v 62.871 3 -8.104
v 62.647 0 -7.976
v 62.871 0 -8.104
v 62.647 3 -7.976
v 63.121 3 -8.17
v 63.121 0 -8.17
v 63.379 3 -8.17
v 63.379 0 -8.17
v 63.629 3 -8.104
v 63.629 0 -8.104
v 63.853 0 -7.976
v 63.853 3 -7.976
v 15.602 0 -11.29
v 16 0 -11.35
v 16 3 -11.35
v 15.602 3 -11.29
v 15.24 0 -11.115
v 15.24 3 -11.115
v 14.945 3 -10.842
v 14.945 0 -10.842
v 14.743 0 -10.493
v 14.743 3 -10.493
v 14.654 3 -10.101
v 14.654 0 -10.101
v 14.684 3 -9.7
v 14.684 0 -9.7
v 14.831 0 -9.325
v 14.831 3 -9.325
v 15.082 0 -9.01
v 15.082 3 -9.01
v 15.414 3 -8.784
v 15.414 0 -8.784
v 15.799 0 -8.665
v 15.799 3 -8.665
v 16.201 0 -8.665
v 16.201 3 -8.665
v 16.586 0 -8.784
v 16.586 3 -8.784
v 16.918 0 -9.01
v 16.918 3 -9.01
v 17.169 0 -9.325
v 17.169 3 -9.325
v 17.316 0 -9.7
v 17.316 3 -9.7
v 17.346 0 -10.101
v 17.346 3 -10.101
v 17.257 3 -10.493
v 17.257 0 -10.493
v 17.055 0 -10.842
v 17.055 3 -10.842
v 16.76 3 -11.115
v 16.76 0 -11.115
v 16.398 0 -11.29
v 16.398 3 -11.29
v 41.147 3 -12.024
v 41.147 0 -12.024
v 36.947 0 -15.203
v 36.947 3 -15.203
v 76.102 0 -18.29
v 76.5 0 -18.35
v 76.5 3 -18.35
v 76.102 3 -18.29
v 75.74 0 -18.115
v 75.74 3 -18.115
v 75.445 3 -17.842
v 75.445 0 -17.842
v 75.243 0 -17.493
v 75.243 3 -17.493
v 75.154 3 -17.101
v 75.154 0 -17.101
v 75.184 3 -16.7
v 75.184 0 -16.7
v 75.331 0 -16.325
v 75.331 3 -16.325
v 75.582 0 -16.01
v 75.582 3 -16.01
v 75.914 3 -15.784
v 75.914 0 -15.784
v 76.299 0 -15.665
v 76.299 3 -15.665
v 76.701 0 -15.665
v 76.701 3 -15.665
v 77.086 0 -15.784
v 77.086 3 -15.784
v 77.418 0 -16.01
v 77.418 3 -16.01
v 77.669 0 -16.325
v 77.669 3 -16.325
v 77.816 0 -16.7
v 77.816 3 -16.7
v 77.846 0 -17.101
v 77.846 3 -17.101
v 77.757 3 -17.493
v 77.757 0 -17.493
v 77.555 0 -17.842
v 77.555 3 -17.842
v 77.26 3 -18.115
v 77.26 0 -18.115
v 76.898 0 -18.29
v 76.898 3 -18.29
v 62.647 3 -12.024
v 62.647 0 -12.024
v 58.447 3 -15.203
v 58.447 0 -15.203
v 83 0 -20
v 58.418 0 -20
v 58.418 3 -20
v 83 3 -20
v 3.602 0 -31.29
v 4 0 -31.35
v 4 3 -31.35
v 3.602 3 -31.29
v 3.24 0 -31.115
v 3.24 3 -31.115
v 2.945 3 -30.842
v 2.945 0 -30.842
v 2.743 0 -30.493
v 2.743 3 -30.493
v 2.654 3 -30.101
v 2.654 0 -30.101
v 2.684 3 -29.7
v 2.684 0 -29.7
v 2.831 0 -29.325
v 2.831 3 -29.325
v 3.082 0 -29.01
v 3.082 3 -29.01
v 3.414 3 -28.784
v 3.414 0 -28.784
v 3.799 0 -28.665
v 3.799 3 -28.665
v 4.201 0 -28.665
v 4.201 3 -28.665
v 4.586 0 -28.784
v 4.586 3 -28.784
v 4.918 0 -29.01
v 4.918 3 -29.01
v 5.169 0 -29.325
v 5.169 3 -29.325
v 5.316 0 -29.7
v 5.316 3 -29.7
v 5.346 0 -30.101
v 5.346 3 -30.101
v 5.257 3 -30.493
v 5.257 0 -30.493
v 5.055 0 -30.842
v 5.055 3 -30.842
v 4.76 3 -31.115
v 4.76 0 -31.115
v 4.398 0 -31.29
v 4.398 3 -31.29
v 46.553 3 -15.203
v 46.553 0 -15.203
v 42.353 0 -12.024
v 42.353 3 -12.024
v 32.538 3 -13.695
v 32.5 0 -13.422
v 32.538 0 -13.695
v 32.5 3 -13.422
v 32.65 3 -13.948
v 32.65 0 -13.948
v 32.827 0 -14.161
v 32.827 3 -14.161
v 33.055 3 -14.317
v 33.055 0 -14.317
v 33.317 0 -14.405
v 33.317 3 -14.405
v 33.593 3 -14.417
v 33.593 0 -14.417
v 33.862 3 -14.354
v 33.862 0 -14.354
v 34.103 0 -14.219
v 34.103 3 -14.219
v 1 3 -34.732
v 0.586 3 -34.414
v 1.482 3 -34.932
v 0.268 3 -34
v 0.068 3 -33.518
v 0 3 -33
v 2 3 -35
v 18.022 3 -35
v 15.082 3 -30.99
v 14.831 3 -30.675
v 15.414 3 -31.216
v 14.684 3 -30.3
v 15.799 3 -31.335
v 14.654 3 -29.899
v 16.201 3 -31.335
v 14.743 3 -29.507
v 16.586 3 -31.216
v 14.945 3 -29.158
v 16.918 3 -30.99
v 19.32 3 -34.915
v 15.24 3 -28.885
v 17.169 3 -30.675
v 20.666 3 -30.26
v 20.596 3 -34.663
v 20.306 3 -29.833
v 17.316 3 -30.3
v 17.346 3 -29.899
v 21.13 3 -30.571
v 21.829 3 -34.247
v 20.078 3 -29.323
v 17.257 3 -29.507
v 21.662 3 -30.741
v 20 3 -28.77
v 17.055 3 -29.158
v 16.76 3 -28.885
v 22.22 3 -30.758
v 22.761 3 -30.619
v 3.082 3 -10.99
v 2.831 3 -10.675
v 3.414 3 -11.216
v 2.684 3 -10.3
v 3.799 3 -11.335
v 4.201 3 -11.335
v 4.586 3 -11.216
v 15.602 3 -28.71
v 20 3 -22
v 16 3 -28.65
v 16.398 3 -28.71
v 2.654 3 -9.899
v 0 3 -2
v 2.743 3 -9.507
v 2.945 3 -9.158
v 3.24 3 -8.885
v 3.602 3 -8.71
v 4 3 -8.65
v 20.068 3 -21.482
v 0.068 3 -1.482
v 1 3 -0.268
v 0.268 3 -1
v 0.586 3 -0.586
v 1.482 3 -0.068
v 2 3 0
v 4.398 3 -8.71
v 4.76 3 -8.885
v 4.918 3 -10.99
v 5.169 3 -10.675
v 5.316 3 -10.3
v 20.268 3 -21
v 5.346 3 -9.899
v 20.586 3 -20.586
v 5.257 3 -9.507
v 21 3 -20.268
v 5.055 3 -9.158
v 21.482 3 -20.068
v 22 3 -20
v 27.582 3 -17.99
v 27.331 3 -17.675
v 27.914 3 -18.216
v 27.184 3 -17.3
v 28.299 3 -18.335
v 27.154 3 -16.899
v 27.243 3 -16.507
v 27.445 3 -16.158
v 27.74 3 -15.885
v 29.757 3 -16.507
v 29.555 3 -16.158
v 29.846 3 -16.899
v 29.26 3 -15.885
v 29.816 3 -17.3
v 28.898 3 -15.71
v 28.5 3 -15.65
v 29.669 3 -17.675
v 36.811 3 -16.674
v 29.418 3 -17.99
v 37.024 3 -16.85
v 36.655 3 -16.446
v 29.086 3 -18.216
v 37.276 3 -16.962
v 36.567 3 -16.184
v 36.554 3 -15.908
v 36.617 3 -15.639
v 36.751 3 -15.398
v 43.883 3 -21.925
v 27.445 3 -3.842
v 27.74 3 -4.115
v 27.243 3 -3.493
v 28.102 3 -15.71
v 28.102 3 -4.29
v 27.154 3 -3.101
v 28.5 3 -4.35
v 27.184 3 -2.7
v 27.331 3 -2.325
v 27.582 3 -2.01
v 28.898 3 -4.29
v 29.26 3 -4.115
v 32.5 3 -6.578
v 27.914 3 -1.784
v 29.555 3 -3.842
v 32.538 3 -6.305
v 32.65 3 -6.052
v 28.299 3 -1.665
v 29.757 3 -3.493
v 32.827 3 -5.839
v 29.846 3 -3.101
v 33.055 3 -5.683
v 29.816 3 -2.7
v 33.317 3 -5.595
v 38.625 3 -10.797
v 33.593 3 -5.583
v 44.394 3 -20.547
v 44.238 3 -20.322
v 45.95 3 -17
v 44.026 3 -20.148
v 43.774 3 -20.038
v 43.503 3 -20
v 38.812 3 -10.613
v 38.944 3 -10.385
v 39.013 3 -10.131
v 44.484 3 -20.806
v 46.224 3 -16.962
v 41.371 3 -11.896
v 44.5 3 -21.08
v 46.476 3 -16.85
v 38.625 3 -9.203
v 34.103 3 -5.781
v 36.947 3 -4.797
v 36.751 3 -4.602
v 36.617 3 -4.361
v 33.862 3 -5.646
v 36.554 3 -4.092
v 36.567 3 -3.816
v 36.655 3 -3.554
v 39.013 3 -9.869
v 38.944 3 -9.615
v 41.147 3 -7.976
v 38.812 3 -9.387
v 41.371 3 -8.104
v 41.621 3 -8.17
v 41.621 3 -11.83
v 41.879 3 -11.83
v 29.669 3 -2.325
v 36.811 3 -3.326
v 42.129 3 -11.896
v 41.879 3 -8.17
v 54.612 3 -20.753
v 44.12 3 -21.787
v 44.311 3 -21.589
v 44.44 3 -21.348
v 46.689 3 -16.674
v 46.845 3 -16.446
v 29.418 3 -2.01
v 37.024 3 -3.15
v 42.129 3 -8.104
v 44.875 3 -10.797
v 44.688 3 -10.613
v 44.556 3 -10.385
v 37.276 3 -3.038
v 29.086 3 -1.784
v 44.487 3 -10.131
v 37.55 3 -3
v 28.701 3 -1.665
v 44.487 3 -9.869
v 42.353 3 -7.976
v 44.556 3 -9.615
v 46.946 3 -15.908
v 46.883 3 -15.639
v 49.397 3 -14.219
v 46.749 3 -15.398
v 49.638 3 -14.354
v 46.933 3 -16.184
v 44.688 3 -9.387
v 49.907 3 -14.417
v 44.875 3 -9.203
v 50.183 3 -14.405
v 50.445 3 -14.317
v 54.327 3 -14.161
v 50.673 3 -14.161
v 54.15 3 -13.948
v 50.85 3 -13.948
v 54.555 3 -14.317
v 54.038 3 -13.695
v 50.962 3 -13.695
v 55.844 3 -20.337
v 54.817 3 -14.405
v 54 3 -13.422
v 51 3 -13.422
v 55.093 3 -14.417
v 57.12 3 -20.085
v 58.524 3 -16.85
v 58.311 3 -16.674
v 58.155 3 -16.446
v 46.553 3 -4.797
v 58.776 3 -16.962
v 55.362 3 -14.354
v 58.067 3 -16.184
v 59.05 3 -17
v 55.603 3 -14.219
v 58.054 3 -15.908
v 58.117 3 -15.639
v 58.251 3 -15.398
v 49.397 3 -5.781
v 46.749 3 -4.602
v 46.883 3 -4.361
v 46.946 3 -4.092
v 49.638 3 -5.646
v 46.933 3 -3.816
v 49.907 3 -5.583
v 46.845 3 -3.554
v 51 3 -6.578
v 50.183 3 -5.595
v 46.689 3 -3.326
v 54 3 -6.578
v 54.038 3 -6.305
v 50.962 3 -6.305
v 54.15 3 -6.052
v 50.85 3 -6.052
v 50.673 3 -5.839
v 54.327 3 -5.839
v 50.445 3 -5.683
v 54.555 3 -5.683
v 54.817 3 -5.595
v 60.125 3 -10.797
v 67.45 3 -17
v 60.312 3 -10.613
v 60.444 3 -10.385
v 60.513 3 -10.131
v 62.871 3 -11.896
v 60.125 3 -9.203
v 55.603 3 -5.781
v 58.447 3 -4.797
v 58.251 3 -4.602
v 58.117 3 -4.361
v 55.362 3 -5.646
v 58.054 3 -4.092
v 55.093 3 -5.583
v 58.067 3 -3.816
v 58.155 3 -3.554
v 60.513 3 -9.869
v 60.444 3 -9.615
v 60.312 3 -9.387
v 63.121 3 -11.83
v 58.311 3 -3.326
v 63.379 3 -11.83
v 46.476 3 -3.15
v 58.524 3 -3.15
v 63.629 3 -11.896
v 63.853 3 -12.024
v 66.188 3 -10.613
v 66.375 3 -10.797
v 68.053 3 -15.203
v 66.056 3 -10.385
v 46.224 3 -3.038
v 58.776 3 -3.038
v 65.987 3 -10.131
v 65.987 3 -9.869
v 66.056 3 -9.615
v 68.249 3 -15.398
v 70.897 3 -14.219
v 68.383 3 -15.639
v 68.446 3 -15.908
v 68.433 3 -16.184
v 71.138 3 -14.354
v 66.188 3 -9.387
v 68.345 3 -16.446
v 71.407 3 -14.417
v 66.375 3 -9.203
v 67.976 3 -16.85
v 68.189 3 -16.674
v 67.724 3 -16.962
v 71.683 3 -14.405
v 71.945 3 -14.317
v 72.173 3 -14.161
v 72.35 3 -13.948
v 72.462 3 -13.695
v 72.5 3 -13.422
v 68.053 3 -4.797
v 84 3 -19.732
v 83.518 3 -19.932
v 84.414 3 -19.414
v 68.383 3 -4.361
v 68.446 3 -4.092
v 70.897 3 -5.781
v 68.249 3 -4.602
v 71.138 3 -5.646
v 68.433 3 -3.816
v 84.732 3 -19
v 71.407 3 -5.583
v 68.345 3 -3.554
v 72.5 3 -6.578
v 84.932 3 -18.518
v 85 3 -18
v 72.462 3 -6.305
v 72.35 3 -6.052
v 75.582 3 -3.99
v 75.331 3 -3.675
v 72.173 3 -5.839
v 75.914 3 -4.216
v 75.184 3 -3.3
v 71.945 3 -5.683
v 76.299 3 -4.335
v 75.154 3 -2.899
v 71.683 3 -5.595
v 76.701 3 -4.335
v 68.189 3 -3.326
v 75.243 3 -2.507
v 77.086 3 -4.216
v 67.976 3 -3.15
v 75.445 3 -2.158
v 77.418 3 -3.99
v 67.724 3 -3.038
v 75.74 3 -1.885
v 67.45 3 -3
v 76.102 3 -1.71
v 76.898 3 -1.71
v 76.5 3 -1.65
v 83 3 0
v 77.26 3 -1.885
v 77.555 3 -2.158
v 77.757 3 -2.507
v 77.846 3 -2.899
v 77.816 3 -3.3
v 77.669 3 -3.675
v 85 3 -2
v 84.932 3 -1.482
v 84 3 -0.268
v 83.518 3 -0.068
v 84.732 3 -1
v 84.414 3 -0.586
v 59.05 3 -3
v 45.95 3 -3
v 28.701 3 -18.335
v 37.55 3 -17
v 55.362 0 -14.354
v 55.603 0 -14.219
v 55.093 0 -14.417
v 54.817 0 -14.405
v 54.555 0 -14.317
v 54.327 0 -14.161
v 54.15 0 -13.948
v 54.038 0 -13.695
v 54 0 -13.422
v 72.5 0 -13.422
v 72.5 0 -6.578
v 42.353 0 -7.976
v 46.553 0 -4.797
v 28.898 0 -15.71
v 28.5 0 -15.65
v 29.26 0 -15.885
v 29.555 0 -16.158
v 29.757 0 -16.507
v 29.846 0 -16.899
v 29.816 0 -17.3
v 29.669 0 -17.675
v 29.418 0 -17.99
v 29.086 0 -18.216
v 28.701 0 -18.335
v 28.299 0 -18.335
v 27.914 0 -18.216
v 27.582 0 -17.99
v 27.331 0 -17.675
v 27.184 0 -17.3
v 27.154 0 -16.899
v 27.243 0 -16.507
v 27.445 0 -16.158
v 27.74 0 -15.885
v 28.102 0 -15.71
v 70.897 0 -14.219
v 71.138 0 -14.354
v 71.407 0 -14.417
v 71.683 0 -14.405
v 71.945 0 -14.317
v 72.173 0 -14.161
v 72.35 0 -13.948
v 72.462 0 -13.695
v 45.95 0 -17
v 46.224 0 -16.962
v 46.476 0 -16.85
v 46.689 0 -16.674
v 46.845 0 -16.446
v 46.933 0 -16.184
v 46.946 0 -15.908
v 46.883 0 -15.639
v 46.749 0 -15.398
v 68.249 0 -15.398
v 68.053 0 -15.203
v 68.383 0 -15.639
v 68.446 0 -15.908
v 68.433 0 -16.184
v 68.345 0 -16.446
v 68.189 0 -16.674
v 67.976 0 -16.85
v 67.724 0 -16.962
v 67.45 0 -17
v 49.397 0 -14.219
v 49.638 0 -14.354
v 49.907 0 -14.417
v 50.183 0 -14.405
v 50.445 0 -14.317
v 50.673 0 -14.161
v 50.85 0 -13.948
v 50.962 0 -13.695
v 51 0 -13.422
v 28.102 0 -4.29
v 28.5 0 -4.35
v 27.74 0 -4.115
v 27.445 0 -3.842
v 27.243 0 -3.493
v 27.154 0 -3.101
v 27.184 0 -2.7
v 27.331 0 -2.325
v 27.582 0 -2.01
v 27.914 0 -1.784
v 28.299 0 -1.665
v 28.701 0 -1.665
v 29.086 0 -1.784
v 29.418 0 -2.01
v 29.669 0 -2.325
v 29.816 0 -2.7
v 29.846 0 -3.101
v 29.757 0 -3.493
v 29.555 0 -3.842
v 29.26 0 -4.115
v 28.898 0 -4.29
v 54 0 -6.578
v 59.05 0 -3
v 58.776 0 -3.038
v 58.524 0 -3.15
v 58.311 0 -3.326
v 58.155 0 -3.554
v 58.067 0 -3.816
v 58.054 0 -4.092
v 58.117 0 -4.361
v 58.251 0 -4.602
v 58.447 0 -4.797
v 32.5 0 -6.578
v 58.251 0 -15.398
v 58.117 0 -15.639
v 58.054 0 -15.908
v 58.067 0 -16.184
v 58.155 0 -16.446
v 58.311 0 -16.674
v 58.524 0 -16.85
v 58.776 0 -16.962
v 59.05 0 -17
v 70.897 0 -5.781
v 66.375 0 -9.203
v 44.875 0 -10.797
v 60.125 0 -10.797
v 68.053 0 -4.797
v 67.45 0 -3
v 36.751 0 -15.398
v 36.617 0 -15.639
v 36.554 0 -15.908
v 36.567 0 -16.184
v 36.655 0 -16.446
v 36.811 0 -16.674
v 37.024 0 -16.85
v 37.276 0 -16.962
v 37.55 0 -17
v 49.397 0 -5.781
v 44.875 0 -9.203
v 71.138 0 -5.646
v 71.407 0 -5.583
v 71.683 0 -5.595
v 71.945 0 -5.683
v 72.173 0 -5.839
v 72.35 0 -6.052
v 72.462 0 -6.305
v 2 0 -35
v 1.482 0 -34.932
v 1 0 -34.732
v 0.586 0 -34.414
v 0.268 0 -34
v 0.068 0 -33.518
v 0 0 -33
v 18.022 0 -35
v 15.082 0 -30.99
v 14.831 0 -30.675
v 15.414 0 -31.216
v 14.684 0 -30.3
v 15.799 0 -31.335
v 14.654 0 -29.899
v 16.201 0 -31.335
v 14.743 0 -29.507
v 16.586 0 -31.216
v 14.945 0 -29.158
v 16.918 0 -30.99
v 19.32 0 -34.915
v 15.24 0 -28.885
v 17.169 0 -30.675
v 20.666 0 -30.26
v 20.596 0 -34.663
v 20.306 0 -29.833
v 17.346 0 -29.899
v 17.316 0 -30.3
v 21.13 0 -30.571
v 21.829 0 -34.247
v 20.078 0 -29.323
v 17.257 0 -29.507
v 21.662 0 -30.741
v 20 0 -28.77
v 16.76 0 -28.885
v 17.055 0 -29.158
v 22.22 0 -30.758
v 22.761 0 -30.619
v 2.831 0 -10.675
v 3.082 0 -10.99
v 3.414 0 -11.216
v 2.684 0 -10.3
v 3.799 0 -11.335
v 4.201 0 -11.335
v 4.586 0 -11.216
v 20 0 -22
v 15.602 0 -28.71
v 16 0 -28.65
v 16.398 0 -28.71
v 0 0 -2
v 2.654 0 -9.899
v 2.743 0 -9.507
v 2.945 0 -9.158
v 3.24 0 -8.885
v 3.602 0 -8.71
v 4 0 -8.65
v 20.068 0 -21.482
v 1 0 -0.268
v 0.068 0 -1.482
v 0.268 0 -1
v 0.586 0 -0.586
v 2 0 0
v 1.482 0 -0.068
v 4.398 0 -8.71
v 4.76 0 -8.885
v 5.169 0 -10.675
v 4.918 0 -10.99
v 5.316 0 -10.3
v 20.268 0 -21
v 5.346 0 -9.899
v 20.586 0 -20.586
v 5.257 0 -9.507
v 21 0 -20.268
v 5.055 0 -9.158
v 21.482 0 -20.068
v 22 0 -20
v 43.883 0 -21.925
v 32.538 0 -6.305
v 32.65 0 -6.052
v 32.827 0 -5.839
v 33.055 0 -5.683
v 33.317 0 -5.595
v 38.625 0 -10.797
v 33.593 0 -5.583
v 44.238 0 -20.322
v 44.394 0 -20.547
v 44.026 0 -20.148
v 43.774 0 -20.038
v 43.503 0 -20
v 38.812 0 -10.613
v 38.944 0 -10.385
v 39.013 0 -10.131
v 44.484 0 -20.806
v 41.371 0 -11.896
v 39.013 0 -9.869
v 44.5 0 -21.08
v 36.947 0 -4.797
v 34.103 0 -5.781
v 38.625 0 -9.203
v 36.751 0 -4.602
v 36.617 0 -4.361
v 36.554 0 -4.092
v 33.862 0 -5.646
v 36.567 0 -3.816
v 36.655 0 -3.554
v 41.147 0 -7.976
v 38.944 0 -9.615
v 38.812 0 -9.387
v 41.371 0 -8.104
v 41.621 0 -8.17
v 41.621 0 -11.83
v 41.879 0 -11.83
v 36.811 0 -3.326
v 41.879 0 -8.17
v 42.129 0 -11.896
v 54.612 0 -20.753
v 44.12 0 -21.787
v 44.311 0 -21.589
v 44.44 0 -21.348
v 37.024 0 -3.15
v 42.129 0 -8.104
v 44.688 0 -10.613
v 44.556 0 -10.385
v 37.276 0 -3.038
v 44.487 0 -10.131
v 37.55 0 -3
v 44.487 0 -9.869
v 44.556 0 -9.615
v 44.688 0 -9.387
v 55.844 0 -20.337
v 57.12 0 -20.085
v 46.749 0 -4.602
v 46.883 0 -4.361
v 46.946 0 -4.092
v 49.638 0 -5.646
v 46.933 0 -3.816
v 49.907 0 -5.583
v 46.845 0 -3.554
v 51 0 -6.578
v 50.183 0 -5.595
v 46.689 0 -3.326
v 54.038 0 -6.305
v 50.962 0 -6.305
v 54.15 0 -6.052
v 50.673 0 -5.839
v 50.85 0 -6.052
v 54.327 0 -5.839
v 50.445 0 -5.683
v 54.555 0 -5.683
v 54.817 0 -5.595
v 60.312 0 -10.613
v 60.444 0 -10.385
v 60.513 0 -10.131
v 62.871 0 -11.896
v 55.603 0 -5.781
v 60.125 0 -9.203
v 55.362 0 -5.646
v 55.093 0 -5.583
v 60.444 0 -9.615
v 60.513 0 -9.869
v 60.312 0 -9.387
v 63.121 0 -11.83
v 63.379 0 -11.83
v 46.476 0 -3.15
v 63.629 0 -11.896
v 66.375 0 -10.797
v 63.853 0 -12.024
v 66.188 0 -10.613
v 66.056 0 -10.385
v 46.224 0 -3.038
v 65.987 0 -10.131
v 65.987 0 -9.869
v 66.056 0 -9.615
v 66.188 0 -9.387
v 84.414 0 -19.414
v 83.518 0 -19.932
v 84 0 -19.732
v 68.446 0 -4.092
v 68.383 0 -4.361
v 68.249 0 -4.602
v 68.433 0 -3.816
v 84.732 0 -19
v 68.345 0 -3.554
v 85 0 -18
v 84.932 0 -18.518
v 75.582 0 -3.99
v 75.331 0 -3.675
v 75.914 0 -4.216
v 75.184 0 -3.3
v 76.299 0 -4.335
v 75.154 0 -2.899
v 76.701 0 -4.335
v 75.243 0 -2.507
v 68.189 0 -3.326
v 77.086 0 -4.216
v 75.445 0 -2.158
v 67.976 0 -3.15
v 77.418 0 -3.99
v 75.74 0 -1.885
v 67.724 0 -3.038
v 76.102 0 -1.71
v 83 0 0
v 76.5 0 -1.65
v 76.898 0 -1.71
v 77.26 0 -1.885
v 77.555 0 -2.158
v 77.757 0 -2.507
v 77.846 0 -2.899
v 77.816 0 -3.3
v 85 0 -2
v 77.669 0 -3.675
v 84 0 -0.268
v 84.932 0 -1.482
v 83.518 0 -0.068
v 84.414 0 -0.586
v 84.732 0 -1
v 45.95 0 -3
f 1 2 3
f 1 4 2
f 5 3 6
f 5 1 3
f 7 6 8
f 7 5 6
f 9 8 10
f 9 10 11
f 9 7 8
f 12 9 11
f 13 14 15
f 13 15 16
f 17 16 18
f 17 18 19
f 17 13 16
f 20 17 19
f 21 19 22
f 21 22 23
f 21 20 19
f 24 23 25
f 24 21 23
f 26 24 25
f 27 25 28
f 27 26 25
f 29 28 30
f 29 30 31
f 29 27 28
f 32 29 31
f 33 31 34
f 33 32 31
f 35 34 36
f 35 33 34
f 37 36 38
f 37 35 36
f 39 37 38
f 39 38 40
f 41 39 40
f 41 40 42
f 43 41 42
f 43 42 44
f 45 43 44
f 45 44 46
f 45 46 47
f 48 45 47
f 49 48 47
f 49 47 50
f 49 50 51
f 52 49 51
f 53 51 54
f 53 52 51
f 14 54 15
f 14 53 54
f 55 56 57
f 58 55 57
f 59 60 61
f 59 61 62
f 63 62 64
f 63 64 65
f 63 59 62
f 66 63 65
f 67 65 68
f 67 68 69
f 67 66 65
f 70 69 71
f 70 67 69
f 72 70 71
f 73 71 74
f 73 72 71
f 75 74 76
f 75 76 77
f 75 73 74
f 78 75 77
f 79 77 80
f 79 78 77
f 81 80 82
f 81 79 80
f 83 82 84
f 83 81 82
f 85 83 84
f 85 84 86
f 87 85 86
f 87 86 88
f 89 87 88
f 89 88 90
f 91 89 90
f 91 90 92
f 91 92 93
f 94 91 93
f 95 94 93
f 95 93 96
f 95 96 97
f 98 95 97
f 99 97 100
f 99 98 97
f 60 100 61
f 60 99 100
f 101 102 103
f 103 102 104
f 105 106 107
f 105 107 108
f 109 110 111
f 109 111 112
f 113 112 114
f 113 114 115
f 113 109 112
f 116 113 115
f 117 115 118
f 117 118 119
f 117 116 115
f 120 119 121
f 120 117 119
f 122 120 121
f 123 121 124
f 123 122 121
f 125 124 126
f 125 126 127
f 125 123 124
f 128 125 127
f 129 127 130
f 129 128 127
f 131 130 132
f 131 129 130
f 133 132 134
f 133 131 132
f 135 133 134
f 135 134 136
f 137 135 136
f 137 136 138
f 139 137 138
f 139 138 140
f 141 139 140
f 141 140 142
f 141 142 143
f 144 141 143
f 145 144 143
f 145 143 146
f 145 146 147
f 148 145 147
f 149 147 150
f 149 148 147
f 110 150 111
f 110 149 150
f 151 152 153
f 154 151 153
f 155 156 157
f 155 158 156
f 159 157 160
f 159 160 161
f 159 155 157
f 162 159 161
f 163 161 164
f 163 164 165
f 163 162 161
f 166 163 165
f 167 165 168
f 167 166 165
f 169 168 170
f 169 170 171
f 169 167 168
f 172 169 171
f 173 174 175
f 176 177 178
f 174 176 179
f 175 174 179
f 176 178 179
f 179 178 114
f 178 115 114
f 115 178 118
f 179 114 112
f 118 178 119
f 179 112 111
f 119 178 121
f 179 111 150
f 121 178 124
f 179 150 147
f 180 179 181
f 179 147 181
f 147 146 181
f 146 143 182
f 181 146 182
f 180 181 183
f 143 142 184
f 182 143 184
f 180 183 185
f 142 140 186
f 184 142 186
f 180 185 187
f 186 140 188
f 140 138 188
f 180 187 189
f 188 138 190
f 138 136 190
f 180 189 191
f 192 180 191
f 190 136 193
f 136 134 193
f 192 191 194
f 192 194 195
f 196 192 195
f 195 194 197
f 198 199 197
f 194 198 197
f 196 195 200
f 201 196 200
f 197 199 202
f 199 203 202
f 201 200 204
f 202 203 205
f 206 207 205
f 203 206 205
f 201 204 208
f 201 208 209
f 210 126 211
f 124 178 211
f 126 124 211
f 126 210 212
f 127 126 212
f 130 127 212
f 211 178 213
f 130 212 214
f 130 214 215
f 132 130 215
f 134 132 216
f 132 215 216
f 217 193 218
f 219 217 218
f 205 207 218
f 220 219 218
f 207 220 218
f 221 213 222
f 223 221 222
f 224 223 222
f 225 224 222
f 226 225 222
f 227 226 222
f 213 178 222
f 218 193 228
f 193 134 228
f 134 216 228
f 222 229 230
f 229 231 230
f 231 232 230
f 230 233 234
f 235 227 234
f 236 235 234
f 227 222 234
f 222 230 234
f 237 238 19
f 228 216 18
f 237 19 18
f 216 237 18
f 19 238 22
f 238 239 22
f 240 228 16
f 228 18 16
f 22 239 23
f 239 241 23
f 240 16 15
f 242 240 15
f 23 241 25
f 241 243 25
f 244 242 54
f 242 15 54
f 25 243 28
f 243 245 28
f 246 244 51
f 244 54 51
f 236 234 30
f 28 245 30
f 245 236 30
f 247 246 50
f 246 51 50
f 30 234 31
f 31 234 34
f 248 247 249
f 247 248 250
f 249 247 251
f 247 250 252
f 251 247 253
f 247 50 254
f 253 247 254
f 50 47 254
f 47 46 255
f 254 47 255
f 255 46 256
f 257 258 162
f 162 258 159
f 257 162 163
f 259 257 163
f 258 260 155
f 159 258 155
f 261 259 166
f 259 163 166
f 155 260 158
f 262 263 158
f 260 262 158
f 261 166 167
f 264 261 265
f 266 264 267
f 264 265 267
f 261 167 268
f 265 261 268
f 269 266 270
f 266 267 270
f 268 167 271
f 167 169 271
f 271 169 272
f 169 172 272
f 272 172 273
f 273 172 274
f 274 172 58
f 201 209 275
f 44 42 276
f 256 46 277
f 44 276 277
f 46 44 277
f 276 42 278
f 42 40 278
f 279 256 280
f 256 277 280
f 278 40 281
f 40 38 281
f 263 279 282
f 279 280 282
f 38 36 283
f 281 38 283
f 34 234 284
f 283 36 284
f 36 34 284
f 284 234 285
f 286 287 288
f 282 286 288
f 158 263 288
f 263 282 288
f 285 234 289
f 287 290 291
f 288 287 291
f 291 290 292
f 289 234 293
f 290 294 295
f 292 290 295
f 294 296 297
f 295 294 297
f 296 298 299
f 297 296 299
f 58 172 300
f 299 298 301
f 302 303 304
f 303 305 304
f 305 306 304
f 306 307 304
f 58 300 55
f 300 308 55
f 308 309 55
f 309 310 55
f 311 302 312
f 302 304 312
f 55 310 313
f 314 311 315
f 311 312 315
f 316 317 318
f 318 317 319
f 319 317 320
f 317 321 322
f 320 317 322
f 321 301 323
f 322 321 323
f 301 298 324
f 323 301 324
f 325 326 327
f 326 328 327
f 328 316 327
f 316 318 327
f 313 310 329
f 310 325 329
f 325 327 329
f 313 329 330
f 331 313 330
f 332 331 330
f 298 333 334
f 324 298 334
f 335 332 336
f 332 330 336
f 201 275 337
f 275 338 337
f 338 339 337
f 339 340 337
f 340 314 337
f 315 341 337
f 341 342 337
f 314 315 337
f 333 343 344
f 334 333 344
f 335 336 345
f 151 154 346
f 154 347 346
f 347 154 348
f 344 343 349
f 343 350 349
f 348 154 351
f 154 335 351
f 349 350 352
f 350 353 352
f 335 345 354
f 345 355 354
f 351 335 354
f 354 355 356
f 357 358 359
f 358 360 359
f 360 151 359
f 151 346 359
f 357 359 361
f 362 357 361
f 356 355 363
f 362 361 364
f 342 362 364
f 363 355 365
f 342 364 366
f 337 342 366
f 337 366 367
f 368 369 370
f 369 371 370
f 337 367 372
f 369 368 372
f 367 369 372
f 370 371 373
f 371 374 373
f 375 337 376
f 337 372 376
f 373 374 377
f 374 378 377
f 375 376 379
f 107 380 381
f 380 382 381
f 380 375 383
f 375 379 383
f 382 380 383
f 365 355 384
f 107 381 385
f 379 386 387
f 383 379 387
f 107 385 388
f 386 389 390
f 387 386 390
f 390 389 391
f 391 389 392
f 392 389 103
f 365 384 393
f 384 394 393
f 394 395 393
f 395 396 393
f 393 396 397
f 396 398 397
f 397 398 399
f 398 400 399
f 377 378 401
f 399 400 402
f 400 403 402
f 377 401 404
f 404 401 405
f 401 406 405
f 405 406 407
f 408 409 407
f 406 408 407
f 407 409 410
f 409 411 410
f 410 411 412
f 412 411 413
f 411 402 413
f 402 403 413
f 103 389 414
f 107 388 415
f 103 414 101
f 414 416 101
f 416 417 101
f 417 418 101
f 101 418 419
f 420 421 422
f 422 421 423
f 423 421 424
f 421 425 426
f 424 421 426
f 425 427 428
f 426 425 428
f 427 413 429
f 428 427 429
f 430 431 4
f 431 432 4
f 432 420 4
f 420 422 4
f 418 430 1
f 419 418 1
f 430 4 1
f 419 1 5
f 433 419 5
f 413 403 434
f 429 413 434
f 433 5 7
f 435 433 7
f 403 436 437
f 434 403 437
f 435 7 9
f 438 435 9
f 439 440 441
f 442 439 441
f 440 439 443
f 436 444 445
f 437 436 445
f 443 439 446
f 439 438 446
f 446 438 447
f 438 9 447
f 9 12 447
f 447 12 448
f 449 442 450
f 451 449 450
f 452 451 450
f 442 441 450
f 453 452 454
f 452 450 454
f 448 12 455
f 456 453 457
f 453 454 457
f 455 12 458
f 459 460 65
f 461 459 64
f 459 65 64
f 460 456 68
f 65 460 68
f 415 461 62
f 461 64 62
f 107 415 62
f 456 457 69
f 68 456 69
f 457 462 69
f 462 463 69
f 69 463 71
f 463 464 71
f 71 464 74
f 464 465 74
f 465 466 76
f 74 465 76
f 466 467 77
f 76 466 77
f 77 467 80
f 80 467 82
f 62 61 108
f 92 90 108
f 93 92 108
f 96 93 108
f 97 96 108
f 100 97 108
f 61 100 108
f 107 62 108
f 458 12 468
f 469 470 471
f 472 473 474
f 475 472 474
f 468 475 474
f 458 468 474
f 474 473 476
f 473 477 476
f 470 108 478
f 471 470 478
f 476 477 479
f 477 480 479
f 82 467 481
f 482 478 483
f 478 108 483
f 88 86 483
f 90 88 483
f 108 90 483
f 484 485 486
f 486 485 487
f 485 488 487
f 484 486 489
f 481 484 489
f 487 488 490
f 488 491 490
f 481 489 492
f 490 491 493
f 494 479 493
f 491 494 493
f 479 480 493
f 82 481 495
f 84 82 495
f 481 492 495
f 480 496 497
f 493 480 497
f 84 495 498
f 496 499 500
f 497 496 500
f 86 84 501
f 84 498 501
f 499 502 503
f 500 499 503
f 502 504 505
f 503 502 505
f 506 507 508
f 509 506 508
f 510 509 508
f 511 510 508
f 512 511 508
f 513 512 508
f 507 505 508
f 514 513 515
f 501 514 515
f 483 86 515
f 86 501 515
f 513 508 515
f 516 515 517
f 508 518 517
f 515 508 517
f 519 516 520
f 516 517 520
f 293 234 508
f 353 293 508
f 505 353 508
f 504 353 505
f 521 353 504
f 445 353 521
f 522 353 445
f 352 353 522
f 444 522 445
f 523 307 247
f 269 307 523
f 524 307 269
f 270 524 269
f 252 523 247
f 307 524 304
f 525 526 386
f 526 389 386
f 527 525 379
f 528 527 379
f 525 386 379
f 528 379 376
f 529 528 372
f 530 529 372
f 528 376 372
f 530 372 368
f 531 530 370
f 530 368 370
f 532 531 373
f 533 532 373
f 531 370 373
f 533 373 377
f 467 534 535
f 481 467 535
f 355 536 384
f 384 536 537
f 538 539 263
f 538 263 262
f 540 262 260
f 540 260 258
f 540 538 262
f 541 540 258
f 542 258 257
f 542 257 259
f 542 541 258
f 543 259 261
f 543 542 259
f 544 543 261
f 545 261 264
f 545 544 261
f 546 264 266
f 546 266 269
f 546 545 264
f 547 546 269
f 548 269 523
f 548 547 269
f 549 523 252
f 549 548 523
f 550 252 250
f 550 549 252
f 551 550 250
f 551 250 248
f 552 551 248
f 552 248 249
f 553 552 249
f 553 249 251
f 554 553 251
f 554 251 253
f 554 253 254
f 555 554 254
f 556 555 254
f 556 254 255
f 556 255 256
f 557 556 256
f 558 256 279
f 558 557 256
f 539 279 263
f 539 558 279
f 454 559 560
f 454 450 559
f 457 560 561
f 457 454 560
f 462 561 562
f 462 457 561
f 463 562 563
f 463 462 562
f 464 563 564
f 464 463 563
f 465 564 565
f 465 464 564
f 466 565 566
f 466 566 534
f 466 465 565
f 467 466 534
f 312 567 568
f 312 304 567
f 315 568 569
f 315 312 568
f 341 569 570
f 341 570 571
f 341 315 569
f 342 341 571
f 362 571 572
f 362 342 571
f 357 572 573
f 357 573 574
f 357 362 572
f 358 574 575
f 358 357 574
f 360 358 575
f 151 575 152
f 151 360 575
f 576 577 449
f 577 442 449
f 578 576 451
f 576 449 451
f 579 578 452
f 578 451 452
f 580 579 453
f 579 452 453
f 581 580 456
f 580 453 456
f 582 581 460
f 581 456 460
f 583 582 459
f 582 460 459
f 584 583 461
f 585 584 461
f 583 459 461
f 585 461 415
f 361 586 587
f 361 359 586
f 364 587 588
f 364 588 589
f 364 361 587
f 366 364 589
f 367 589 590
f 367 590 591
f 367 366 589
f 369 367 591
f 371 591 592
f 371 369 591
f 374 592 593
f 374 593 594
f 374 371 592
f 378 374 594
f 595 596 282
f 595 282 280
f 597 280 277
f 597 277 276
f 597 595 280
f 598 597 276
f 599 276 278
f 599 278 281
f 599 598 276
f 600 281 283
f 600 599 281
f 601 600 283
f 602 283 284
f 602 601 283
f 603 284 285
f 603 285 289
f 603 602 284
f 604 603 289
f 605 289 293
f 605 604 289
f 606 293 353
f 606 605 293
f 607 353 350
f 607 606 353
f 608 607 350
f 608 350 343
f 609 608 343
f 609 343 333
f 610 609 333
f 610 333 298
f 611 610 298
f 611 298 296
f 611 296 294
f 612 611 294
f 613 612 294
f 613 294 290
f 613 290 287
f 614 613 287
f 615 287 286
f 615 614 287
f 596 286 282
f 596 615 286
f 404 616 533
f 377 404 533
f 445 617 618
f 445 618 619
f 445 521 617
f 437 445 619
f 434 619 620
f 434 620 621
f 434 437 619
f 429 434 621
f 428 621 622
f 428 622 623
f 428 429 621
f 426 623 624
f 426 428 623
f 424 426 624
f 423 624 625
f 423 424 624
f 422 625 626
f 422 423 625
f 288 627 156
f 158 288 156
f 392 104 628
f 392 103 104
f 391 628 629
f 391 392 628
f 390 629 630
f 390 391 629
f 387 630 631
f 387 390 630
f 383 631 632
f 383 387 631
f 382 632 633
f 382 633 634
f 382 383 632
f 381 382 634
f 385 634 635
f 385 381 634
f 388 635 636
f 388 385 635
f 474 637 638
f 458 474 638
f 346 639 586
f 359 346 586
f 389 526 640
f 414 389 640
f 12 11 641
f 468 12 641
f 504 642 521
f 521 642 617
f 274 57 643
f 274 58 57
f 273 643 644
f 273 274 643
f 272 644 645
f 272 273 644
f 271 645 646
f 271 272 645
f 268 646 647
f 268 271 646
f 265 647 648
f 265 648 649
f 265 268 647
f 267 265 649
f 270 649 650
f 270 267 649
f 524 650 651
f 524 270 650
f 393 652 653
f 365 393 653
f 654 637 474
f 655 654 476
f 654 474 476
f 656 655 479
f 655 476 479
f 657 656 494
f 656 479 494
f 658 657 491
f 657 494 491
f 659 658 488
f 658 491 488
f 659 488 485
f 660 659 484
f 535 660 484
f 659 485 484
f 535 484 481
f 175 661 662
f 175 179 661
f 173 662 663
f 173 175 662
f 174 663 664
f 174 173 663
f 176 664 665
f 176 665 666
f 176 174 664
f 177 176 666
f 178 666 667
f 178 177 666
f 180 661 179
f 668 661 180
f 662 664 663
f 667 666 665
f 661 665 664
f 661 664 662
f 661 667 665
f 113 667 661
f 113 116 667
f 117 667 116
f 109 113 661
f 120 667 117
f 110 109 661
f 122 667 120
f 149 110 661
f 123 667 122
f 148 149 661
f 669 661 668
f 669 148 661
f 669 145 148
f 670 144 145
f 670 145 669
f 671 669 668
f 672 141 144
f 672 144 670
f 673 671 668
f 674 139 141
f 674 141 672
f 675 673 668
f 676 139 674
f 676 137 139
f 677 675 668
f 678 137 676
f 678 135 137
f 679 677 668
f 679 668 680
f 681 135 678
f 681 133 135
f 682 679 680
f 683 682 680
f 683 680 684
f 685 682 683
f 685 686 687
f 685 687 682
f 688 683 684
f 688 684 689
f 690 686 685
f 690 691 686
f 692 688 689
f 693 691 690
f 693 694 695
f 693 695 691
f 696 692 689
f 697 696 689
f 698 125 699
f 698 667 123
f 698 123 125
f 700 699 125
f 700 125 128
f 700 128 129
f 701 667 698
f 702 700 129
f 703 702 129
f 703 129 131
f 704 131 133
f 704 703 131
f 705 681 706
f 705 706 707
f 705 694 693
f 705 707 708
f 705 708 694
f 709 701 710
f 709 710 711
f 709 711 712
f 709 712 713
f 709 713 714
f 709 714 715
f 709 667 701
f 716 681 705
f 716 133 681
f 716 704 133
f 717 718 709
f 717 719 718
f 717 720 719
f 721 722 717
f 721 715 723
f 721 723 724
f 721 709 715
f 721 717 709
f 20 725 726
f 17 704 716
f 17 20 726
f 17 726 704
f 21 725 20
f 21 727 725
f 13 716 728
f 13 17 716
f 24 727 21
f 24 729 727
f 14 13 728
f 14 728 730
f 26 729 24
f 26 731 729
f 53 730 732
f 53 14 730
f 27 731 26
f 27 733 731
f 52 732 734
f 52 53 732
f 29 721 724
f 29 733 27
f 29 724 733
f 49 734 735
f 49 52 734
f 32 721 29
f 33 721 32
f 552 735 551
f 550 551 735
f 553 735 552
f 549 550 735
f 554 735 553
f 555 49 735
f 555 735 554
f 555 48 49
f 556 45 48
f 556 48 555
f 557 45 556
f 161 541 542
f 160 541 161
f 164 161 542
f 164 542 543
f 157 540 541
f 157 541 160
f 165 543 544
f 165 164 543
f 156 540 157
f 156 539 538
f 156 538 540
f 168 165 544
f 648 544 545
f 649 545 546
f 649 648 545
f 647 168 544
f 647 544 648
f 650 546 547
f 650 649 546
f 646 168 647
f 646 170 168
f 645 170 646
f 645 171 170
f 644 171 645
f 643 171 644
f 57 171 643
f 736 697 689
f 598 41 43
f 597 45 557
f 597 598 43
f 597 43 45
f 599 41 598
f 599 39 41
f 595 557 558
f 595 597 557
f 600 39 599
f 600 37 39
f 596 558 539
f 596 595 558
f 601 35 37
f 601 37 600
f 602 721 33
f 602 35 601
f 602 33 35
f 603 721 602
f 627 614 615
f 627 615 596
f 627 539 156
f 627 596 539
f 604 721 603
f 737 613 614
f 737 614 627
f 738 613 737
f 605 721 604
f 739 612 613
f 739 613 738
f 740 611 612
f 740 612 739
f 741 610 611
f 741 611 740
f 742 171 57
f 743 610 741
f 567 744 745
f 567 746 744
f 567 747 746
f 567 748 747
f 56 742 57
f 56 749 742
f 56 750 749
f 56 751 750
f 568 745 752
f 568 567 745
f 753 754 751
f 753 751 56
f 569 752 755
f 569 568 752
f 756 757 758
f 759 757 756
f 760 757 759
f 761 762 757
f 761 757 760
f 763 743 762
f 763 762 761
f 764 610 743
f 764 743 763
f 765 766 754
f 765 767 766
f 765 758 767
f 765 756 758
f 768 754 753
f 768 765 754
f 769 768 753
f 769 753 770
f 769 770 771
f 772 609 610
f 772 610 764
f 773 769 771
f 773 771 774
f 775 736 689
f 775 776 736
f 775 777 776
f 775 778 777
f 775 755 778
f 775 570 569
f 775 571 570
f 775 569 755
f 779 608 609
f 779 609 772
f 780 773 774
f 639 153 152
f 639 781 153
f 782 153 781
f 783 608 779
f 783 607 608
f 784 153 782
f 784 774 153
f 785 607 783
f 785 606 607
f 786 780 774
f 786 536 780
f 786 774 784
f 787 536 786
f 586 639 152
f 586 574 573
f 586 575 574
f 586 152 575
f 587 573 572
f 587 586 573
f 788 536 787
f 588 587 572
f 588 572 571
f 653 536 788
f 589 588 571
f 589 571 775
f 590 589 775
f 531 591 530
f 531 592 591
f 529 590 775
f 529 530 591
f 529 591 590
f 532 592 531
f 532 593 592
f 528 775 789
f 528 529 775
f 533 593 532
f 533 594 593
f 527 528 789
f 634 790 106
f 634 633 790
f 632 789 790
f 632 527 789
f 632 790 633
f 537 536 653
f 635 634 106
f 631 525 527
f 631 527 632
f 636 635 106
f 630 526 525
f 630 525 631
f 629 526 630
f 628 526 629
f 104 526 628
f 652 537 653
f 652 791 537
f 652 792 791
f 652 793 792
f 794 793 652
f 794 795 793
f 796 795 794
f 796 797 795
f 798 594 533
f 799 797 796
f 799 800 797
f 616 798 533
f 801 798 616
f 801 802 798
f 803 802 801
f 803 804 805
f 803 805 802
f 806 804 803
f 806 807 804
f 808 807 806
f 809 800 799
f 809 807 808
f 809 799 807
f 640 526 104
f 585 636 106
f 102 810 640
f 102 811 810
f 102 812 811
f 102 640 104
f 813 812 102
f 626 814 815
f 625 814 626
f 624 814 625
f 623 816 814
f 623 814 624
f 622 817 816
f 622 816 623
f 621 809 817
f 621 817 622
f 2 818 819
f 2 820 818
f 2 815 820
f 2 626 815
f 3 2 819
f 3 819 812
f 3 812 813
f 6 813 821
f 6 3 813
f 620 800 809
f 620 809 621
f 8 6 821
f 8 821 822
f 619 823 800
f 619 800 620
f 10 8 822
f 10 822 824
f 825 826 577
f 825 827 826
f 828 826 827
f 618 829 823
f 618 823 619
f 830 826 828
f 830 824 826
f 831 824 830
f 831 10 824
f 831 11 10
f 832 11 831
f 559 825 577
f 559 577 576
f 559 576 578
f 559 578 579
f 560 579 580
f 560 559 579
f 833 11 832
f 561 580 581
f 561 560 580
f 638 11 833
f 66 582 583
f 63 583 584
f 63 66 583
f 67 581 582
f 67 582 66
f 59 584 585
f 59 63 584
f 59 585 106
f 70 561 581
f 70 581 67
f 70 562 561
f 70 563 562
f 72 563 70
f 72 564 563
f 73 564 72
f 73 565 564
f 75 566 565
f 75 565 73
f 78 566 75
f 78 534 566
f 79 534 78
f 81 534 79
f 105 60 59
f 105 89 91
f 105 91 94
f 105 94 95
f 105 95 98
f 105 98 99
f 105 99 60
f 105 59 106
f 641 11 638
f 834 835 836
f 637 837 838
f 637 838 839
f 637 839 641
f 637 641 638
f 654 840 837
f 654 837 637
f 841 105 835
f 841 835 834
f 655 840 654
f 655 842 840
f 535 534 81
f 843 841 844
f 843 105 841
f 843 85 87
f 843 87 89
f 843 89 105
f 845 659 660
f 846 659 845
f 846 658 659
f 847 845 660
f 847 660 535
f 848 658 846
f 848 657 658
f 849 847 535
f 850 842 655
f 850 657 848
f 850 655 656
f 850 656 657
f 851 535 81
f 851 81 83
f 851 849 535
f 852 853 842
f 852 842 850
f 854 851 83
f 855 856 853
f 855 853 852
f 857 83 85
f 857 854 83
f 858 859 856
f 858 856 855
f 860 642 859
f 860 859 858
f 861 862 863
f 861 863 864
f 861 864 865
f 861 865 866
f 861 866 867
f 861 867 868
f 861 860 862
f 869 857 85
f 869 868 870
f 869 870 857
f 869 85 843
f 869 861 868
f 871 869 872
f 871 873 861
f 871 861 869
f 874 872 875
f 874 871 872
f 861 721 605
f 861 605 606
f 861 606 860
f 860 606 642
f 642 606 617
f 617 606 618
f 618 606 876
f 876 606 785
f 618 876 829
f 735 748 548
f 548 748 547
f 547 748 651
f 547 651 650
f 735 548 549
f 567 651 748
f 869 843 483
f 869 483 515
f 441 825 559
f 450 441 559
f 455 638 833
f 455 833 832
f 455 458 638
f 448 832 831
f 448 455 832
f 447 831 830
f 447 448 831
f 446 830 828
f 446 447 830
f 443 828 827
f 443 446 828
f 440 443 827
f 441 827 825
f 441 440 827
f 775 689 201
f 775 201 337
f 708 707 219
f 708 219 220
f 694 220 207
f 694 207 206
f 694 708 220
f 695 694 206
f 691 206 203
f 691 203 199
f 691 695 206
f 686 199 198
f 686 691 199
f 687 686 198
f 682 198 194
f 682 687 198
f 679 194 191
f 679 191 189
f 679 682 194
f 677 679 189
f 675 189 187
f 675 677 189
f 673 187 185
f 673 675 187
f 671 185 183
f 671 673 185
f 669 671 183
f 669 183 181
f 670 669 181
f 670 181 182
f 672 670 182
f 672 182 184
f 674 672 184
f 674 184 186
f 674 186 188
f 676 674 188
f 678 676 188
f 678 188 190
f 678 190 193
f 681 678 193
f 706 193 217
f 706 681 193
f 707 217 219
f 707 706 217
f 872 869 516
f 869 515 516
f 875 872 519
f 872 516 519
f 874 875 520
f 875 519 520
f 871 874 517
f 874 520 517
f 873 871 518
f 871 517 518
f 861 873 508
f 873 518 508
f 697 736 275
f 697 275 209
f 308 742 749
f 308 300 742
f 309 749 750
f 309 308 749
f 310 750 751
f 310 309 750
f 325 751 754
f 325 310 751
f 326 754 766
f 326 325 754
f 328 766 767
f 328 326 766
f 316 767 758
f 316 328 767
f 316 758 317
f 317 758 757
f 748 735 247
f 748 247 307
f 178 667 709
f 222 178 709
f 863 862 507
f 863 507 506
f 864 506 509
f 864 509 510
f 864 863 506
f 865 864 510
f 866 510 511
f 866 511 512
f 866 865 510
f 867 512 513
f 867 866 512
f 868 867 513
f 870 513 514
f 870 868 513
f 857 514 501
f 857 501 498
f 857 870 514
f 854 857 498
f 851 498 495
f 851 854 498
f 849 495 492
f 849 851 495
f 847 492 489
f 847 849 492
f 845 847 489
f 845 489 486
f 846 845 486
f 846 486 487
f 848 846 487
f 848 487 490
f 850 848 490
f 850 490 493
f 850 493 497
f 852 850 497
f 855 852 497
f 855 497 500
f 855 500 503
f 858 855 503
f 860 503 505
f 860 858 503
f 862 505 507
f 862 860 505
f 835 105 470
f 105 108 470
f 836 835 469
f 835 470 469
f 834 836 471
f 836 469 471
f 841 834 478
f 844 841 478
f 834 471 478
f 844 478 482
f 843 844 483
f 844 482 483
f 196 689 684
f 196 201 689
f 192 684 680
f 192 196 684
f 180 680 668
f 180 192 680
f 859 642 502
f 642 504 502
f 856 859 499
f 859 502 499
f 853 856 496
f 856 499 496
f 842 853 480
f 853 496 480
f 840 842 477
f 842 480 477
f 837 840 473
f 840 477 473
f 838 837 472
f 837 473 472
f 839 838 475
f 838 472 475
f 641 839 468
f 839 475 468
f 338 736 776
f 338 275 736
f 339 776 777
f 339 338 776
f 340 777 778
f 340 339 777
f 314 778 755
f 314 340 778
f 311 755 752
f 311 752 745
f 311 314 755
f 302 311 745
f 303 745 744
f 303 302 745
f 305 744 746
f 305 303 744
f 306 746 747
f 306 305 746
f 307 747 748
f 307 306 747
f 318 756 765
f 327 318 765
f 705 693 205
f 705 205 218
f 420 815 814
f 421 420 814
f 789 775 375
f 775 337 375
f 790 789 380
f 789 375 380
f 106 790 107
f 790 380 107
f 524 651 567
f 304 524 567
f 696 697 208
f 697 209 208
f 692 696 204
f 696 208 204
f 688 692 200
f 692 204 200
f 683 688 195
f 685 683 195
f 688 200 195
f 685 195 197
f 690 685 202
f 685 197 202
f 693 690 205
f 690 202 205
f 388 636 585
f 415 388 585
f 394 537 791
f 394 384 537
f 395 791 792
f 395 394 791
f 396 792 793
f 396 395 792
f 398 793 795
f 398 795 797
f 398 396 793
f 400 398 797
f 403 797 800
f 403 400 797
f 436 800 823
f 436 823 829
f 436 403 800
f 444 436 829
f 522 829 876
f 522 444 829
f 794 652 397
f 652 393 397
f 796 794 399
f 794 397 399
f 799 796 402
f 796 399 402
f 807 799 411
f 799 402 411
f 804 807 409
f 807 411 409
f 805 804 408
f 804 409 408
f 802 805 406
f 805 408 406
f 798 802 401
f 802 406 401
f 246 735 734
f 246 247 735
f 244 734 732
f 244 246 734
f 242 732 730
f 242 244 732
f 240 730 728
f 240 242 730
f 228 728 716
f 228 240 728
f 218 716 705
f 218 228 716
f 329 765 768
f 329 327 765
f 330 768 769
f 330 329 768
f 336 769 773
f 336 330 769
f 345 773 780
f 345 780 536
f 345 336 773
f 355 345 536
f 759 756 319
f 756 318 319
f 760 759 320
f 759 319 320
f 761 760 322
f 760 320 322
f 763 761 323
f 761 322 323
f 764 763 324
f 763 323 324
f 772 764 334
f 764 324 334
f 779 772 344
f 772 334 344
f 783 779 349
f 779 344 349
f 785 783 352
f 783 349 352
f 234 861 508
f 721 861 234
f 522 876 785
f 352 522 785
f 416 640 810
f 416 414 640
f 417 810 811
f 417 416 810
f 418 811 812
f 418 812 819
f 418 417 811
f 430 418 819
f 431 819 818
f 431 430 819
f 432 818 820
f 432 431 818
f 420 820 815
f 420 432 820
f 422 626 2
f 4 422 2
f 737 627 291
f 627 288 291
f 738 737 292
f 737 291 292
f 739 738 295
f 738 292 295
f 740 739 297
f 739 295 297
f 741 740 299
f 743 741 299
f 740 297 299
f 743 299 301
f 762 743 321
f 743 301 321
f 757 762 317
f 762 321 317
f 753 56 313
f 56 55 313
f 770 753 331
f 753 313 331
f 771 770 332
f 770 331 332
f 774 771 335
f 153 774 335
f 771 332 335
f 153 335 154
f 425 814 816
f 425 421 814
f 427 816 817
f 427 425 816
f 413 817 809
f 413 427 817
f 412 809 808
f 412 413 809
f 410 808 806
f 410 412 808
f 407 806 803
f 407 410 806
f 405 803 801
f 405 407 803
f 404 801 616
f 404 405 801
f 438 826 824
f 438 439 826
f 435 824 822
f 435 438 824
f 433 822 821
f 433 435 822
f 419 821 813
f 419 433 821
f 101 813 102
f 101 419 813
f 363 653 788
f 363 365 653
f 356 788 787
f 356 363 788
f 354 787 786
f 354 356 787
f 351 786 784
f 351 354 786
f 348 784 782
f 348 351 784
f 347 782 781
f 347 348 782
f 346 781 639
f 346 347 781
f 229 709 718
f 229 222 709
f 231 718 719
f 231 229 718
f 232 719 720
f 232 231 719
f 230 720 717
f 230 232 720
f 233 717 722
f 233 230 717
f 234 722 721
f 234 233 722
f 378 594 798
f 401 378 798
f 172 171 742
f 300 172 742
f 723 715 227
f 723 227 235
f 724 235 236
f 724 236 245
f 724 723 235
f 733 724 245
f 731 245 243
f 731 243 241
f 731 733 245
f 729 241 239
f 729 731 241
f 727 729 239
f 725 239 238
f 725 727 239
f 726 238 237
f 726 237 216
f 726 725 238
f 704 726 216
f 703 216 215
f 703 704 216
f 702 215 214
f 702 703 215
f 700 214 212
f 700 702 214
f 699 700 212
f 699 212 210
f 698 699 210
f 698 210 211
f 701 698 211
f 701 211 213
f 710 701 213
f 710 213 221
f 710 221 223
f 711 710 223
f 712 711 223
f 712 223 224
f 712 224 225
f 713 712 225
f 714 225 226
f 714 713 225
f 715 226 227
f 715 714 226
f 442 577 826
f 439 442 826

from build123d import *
from OCP.BRepFilletAPI import BRepFilletAPI_MakeFillet

# Parameters (mm, degrees)
SKETCH_1_R          = 1.35
EXTRUDE_1_DEPTH     = 3
EXTRUDE_2_DEPTH     = 3
CUT_EXTRUDE_1_DEPTH = 10
FILLET_1_R1         = 1
FILLET_1_R2         = 2
FILLET_1_R3         = 10
FILLET_2_R          = 1


with BuildPart() as part:
    # 草图1 → 凸台-拉伸1 (new body)
    with BuildSketch(Plane(origin=(0, 0, 0), x_dir=(1, 0, 0), z_dir=(0, 1, 0))):
        Polygon((0, 35), (20, 35), (20, 20), (85, 20), (85, 0), (0, 0), (0, 10), align=None)
        with Locations(Location((76.5, 3, 0), (0, 0, 270))):
            Circle(SKETCH_1_R, mode=Mode.SUBTRACT)
        with Locations(Location((76.5, 17, 0), (0, 0, 90))):
            Circle(SKETCH_1_R, mode=Mode.SUBTRACT)
        with Locations(Location((28.5, 17, 0), (0, 0, 270))):
            Circle(SKETCH_1_R, mode=Mode.SUBTRACT)
        with Locations(Location((28.5, 3, 0), (0, 0, 90))):
            Circle(SKETCH_1_R, mode=Mode.SUBTRACT)
        with Locations(Location((4, 10, 0), (0, 0, 270))):
            Circle(SKETCH_1_R, mode=Mode.SUBTRACT)
        with Locations(Location((4, 30, 0), (0, 0, 90))):
            Circle(SKETCH_1_R, mode=Mode.SUBTRACT)
        with Locations(Location((16, 30, 0), (0, 0, 270))):
            Circle(SKETCH_1_R, mode=Mode.SUBTRACT)
        with Locations(Location((16, 10, 0), (0, 0, 90))):
            Circle(SKETCH_1_R, mode=Mode.SUBTRACT)
    extrude(amount=EXTRUDE_1_DEPTH)

    # 草图3 → 凸台-拉伸2 (add)
    with BuildSketch(Plane.XZ):
        Polygon((20, -31.755784464), (20, -35), (56.44071813, -20), (48.55928187, -20), align=None)
    extrude(amount=-EXTRUDE_2_DEPTH)

    # 草图4 → 切除-拉伸1 (cut)
    with BuildSketch(Plane.XZ):
        Polygon((34.571447814, -3), (41.75, -8.432417871), (48.928552186, -3), align=None)
        Polygon((32.5, -4.567582129), (32.5, -15.432417871), (39.678552186, -10), align=None)
        Polygon((41.75, -11.567582129), (34.571447814, -17), (48.928552186, -17), align=None)
        Polygon((51, -4.567582129), (43.821447814, -10), (51, -15.432417871), align=None)
        Polygon((54, -15.432417871), (61.178552186, -10), (54, -4.567582129), align=None)
        Polygon((70.428552186, -3), (56.071447814, -3), (63.25, -8.432417871), align=None)
        Polygon((72.5, -4.567582129), (65.321447814, -10), (72.5, -15.432417871), align=None)
        Polygon((70.428552186, -17), (63.25, -11.567582129), (56.071447814, -17), align=None)
    extrude(amount=-CUT_EXTRUDE_1_DEPTH, mode=Mode.SUBTRACT)

    # 圆角1: one fillet with a radius per group of edges: ONE call of the kernel's fillet builder (fillet() takes one radius for all edges)
    fillet_1_edges_1 = [part.edges().sort_by_distance(p)[0] for p in [
        (48.55928187, 1.5, -20),
    ]]
    fillet_1_edges_2 = [part.edges().sort_by_distance(p)[0] for p in [
        (20, 1.5, -20),
        (20, 1.5, -31.755784464),
        (0, 1.5, -35),
        (0, 1.5, 0),
        (85, 1.5, 0),
        (85, 1.5, -20),
    ]]
    fillet_1_edges_3 = [part.edges().sort_by_distance(p)[0] for p in [
        (56.44071813, 1.5, -20),
        (20, 1.5, -35),
    ]]
    fillet_1 = BRepFilletAPI_MakeFillet(part.part.solid().wrapped)
    for e in fillet_1_edges_1:
        fillet_1.Add(FILLET_1_R1, e.wrapped)
    for e in fillet_1_edges_2:
        fillet_1.Add(FILLET_1_R2, e.wrapped)
    for e in fillet_1_edges_3:
        fillet_1.Add(FILLET_1_R3, e.wrapped)
    add(Compound.cast(fillet_1.Shape()), mode=Mode.REPLACE)

    # 圆角2
    fillet_2_edges = [part.edges().sort_by_distance(p)[0] for p in [
        (43.821447814, 1.5, -10),
        (51, 1.5, -4.567582129),
        (51, 1.5, -15.432417871),
        (39.678552186, 1.5, -10),
        (32.5, 1.5, -15.432417871),
        (32.5, 1.5, -4.567582129),
        (34.571447814, 1.5, -17),
        (41.75, 1.5, -11.567582129),
        (48.928552186, 1.5, -17),
        (70.428552186, 1.5, -17),
        (56.071447814, 1.5, -17),
        (63.25, 1.5, -11.567582129),
        (70.428552186, 1.5, -3),
        (63.25, 1.5, -8.432417871),
        (56.071447814, 1.5, -3),
        (72.5, 1.5, -15.432417871),
        (65.321447814, 1.5, -10),
        (72.5, 1.5, -4.567582129),
        (48.928552186, 1.5, -3),
        (41.75, 1.5, -8.432417871),
        (34.571447814, 1.5, -3),
        (54, 1.5, -15.432417871),
        (54, 1.5, -4.567582129),
        (61.178552186, 1.5, -10),
    ]]
    fillet(fillet_2_edges, radius=FILLET_2_R)


solid = part.part
